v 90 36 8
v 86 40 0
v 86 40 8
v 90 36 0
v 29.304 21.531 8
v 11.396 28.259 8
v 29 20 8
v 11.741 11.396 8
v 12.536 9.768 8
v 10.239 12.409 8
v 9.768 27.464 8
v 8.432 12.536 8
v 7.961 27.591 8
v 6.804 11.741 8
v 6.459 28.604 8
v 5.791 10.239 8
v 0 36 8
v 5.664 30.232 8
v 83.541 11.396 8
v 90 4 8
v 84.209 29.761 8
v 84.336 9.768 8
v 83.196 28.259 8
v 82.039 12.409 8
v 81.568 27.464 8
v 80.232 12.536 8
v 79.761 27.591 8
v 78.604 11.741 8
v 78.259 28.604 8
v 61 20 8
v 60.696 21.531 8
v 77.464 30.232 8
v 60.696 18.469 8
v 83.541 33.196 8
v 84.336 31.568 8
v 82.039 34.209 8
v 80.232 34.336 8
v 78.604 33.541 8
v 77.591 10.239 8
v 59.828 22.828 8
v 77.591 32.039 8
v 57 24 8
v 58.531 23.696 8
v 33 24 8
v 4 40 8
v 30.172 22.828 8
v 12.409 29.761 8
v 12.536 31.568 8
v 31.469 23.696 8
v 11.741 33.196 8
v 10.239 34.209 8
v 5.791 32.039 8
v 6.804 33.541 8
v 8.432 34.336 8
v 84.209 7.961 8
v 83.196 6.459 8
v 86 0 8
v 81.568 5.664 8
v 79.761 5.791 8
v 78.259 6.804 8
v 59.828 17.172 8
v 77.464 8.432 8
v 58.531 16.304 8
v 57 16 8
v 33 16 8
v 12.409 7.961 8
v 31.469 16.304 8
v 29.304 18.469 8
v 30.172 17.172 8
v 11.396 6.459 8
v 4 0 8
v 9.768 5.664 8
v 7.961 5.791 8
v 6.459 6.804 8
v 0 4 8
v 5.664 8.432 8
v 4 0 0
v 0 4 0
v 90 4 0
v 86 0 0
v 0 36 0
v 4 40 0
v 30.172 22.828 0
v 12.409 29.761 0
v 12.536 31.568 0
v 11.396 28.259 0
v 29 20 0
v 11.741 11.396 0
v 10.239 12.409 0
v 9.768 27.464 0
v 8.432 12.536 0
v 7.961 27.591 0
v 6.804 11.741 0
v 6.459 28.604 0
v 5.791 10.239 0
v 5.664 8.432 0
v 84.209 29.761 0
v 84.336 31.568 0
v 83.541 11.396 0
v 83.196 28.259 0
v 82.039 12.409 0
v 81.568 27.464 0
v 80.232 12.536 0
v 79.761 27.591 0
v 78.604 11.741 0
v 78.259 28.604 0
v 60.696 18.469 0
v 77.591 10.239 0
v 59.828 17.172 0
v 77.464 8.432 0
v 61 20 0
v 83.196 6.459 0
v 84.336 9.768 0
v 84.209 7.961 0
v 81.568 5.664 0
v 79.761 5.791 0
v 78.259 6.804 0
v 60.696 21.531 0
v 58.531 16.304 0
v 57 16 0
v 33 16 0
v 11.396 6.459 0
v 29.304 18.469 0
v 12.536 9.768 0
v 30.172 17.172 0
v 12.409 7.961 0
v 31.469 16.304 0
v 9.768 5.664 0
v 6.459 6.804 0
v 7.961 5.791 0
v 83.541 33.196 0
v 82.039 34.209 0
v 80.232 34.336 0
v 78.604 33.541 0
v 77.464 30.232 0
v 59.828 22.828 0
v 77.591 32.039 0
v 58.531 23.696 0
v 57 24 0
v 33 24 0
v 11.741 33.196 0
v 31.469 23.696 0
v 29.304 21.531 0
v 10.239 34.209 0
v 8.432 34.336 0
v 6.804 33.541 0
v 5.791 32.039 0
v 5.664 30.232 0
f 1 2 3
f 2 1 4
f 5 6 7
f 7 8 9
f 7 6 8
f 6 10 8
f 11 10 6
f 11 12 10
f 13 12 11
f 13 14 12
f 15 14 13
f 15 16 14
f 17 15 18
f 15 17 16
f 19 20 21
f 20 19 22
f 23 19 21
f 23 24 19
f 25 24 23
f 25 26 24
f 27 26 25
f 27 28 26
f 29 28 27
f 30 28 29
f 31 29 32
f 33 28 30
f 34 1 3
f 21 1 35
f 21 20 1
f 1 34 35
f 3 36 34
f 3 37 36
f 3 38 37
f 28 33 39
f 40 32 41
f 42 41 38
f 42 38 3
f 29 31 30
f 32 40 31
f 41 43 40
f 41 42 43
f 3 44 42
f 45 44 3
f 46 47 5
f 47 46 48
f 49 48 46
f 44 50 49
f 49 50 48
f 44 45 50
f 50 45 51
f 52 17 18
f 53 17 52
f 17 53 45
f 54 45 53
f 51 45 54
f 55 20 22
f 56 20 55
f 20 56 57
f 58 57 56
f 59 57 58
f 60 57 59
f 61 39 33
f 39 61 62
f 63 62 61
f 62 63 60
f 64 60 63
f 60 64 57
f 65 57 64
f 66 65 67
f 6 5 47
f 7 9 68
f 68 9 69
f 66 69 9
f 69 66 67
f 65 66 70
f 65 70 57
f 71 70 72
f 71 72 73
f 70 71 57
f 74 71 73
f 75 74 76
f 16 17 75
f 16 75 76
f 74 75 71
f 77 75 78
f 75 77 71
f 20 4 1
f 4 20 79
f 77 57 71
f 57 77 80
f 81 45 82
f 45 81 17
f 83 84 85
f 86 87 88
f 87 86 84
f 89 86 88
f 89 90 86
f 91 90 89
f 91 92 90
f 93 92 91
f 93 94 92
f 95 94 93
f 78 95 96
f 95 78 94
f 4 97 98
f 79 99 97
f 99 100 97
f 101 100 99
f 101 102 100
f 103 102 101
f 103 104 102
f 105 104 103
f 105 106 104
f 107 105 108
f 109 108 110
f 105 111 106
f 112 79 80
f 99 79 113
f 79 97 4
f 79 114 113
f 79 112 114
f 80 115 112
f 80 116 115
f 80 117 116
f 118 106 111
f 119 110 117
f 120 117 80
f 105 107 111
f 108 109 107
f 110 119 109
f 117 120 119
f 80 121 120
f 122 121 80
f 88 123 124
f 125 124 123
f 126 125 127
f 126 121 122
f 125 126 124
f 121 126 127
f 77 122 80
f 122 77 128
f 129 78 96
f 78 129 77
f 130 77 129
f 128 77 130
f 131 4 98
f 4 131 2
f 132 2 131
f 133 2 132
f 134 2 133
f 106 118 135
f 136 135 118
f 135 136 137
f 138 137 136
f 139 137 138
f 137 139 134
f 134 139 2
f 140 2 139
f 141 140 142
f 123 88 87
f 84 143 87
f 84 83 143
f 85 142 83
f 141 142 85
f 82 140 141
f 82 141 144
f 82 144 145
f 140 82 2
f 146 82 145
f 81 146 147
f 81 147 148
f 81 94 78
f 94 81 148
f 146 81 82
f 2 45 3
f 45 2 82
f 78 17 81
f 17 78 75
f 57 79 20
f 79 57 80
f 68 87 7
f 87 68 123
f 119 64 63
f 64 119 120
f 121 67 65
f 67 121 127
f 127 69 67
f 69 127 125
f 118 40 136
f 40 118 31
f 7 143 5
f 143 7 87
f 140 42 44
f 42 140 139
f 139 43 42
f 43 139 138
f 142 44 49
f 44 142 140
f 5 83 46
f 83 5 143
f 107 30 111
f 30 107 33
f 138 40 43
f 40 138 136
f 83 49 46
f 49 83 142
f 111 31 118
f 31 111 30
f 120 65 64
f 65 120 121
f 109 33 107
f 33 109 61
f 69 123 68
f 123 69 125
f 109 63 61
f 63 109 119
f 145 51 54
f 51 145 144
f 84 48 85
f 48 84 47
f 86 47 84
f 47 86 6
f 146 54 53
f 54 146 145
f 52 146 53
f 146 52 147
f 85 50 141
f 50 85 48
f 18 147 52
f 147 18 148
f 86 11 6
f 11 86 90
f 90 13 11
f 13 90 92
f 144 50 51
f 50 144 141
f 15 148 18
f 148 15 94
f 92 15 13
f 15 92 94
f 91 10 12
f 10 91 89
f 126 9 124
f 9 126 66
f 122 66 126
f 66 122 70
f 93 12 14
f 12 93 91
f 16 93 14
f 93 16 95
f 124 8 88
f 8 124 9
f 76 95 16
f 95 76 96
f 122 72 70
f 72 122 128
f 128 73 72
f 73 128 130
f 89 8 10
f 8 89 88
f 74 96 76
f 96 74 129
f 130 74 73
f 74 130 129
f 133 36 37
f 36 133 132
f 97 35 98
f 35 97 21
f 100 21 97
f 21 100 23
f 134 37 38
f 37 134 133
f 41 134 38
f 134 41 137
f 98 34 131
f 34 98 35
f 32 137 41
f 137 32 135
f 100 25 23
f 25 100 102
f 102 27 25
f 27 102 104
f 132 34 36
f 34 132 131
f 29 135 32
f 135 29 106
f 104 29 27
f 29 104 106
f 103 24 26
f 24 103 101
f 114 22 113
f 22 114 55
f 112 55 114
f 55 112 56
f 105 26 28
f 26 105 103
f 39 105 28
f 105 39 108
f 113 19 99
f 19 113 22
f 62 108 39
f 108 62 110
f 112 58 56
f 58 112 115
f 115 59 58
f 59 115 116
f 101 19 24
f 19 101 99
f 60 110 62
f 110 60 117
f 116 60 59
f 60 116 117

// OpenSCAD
$fn = 32;

// ----------------------------------------------------------------------
// Bracket plate: slot plate 90 x 40
// ----------------------------------------------------------------------

// --- parameters (mm) ---
hole_r = 3.5;             // bolt hole radius
plate_t = 8;              // plate thickness, Z (extrusion height)
plate_l = 90;             // plate length
plate_w = 40;             // plate width
slot_l = 24;              // slot straight length
slot_r = 4;               // slot end radius
fit_tol = 0.05;           // declared fit tolerance (prompt contract)
free_tol = 0.3;           // declared free tolerance (prompt contract)

slot_len = slot_l + 2 * slot_r;
slot_w = 2 * slot_r;
hole_d2 = 2 * hole_r;

profile = [[4, 0], [86, 0], [90, 4], [90, 36], [86, 40], [4, 40], [0, 36], [0, 4]];  // primary outline, 8 points, counter clockwise
void_1 = [[57, 16], [58.531, 16.304], [59.828, 17.172], [60.696, 18.469], [61, 20], [60.696, 21.531], [59.828, 22.828], [58.531, 23.696], [57, 24], [33, 24], [31.469, 23.696], [30.172, 22.828], [29.304, 21.531], [29, 20], [29.304, 18.469], [30.172, 17.172], [31.469, 16.304], [33, 16]];  // grip slot, 18 points
void_2 = [[12.536, 31.568], [11.741, 33.196], [10.239, 34.209], [8.432, 34.336], [6.804, 33.541], [5.791, 32.039], [5.664, 30.232], [6.459, 28.604], [7.961, 27.591], [9.768, 27.464], [11.396, 28.259], [12.409, 29.761]];  // corner hole, 12 points
void_3 = [[12.536, 9.768], [11.741, 11.396], [10.239, 12.409], [8.432, 12.536], [6.804, 11.741], [5.791, 10.239], [5.664, 8.432], [6.459, 6.804], [7.961, 5.791], [9.768, 5.664], [11.396, 6.459], [12.409, 7.961]];  // corner hole, 12 points
void_4 = [[84.336, 31.568], [83.541, 33.196], [82.039, 34.209], [80.232, 34.336], [78.604, 33.541], [77.591, 32.039], [77.464, 30.232], [78.259, 28.604], [79.761, 27.591], [81.568, 27.464], [83.196, 28.259], [84.209, 29.761]];  // corner hole, 12 points
void_5 = [[84.336, 9.768], [83.541, 11.396], [82.039, 12.409], [80.232, 12.536], [78.604, 11.741], [77.591, 10.239], [77.464, 8.432], [78.259, 6.804], [79.761, 5.791], [81.568, 5.664], [83.196, 6.459], [84.209, 7.961]];  // corner hole, 12 points

// --- the one profile operation ---
difference() {
  linear_extrude(height = plate_t) polygon(points = profile);
  translate([0, 0, -1])
    linear_extrude(height = plate_t + 2) polygon(points = void_1);
  translate([0, 0, -1])
    linear_extrude(height = plate_t + 2) polygon(points = void_2);
  translate([0, 0, -1])
    linear_extrude(height = plate_t + 2) polygon(points = void_3);
  translate([0, 0, -1])
    linear_extrude(height = plate_t + 2) polygon(points = void_4);
  translate([0, 0, -1])
    linear_extrude(height = plate_t + 2) polygon(points = void_5);
}
